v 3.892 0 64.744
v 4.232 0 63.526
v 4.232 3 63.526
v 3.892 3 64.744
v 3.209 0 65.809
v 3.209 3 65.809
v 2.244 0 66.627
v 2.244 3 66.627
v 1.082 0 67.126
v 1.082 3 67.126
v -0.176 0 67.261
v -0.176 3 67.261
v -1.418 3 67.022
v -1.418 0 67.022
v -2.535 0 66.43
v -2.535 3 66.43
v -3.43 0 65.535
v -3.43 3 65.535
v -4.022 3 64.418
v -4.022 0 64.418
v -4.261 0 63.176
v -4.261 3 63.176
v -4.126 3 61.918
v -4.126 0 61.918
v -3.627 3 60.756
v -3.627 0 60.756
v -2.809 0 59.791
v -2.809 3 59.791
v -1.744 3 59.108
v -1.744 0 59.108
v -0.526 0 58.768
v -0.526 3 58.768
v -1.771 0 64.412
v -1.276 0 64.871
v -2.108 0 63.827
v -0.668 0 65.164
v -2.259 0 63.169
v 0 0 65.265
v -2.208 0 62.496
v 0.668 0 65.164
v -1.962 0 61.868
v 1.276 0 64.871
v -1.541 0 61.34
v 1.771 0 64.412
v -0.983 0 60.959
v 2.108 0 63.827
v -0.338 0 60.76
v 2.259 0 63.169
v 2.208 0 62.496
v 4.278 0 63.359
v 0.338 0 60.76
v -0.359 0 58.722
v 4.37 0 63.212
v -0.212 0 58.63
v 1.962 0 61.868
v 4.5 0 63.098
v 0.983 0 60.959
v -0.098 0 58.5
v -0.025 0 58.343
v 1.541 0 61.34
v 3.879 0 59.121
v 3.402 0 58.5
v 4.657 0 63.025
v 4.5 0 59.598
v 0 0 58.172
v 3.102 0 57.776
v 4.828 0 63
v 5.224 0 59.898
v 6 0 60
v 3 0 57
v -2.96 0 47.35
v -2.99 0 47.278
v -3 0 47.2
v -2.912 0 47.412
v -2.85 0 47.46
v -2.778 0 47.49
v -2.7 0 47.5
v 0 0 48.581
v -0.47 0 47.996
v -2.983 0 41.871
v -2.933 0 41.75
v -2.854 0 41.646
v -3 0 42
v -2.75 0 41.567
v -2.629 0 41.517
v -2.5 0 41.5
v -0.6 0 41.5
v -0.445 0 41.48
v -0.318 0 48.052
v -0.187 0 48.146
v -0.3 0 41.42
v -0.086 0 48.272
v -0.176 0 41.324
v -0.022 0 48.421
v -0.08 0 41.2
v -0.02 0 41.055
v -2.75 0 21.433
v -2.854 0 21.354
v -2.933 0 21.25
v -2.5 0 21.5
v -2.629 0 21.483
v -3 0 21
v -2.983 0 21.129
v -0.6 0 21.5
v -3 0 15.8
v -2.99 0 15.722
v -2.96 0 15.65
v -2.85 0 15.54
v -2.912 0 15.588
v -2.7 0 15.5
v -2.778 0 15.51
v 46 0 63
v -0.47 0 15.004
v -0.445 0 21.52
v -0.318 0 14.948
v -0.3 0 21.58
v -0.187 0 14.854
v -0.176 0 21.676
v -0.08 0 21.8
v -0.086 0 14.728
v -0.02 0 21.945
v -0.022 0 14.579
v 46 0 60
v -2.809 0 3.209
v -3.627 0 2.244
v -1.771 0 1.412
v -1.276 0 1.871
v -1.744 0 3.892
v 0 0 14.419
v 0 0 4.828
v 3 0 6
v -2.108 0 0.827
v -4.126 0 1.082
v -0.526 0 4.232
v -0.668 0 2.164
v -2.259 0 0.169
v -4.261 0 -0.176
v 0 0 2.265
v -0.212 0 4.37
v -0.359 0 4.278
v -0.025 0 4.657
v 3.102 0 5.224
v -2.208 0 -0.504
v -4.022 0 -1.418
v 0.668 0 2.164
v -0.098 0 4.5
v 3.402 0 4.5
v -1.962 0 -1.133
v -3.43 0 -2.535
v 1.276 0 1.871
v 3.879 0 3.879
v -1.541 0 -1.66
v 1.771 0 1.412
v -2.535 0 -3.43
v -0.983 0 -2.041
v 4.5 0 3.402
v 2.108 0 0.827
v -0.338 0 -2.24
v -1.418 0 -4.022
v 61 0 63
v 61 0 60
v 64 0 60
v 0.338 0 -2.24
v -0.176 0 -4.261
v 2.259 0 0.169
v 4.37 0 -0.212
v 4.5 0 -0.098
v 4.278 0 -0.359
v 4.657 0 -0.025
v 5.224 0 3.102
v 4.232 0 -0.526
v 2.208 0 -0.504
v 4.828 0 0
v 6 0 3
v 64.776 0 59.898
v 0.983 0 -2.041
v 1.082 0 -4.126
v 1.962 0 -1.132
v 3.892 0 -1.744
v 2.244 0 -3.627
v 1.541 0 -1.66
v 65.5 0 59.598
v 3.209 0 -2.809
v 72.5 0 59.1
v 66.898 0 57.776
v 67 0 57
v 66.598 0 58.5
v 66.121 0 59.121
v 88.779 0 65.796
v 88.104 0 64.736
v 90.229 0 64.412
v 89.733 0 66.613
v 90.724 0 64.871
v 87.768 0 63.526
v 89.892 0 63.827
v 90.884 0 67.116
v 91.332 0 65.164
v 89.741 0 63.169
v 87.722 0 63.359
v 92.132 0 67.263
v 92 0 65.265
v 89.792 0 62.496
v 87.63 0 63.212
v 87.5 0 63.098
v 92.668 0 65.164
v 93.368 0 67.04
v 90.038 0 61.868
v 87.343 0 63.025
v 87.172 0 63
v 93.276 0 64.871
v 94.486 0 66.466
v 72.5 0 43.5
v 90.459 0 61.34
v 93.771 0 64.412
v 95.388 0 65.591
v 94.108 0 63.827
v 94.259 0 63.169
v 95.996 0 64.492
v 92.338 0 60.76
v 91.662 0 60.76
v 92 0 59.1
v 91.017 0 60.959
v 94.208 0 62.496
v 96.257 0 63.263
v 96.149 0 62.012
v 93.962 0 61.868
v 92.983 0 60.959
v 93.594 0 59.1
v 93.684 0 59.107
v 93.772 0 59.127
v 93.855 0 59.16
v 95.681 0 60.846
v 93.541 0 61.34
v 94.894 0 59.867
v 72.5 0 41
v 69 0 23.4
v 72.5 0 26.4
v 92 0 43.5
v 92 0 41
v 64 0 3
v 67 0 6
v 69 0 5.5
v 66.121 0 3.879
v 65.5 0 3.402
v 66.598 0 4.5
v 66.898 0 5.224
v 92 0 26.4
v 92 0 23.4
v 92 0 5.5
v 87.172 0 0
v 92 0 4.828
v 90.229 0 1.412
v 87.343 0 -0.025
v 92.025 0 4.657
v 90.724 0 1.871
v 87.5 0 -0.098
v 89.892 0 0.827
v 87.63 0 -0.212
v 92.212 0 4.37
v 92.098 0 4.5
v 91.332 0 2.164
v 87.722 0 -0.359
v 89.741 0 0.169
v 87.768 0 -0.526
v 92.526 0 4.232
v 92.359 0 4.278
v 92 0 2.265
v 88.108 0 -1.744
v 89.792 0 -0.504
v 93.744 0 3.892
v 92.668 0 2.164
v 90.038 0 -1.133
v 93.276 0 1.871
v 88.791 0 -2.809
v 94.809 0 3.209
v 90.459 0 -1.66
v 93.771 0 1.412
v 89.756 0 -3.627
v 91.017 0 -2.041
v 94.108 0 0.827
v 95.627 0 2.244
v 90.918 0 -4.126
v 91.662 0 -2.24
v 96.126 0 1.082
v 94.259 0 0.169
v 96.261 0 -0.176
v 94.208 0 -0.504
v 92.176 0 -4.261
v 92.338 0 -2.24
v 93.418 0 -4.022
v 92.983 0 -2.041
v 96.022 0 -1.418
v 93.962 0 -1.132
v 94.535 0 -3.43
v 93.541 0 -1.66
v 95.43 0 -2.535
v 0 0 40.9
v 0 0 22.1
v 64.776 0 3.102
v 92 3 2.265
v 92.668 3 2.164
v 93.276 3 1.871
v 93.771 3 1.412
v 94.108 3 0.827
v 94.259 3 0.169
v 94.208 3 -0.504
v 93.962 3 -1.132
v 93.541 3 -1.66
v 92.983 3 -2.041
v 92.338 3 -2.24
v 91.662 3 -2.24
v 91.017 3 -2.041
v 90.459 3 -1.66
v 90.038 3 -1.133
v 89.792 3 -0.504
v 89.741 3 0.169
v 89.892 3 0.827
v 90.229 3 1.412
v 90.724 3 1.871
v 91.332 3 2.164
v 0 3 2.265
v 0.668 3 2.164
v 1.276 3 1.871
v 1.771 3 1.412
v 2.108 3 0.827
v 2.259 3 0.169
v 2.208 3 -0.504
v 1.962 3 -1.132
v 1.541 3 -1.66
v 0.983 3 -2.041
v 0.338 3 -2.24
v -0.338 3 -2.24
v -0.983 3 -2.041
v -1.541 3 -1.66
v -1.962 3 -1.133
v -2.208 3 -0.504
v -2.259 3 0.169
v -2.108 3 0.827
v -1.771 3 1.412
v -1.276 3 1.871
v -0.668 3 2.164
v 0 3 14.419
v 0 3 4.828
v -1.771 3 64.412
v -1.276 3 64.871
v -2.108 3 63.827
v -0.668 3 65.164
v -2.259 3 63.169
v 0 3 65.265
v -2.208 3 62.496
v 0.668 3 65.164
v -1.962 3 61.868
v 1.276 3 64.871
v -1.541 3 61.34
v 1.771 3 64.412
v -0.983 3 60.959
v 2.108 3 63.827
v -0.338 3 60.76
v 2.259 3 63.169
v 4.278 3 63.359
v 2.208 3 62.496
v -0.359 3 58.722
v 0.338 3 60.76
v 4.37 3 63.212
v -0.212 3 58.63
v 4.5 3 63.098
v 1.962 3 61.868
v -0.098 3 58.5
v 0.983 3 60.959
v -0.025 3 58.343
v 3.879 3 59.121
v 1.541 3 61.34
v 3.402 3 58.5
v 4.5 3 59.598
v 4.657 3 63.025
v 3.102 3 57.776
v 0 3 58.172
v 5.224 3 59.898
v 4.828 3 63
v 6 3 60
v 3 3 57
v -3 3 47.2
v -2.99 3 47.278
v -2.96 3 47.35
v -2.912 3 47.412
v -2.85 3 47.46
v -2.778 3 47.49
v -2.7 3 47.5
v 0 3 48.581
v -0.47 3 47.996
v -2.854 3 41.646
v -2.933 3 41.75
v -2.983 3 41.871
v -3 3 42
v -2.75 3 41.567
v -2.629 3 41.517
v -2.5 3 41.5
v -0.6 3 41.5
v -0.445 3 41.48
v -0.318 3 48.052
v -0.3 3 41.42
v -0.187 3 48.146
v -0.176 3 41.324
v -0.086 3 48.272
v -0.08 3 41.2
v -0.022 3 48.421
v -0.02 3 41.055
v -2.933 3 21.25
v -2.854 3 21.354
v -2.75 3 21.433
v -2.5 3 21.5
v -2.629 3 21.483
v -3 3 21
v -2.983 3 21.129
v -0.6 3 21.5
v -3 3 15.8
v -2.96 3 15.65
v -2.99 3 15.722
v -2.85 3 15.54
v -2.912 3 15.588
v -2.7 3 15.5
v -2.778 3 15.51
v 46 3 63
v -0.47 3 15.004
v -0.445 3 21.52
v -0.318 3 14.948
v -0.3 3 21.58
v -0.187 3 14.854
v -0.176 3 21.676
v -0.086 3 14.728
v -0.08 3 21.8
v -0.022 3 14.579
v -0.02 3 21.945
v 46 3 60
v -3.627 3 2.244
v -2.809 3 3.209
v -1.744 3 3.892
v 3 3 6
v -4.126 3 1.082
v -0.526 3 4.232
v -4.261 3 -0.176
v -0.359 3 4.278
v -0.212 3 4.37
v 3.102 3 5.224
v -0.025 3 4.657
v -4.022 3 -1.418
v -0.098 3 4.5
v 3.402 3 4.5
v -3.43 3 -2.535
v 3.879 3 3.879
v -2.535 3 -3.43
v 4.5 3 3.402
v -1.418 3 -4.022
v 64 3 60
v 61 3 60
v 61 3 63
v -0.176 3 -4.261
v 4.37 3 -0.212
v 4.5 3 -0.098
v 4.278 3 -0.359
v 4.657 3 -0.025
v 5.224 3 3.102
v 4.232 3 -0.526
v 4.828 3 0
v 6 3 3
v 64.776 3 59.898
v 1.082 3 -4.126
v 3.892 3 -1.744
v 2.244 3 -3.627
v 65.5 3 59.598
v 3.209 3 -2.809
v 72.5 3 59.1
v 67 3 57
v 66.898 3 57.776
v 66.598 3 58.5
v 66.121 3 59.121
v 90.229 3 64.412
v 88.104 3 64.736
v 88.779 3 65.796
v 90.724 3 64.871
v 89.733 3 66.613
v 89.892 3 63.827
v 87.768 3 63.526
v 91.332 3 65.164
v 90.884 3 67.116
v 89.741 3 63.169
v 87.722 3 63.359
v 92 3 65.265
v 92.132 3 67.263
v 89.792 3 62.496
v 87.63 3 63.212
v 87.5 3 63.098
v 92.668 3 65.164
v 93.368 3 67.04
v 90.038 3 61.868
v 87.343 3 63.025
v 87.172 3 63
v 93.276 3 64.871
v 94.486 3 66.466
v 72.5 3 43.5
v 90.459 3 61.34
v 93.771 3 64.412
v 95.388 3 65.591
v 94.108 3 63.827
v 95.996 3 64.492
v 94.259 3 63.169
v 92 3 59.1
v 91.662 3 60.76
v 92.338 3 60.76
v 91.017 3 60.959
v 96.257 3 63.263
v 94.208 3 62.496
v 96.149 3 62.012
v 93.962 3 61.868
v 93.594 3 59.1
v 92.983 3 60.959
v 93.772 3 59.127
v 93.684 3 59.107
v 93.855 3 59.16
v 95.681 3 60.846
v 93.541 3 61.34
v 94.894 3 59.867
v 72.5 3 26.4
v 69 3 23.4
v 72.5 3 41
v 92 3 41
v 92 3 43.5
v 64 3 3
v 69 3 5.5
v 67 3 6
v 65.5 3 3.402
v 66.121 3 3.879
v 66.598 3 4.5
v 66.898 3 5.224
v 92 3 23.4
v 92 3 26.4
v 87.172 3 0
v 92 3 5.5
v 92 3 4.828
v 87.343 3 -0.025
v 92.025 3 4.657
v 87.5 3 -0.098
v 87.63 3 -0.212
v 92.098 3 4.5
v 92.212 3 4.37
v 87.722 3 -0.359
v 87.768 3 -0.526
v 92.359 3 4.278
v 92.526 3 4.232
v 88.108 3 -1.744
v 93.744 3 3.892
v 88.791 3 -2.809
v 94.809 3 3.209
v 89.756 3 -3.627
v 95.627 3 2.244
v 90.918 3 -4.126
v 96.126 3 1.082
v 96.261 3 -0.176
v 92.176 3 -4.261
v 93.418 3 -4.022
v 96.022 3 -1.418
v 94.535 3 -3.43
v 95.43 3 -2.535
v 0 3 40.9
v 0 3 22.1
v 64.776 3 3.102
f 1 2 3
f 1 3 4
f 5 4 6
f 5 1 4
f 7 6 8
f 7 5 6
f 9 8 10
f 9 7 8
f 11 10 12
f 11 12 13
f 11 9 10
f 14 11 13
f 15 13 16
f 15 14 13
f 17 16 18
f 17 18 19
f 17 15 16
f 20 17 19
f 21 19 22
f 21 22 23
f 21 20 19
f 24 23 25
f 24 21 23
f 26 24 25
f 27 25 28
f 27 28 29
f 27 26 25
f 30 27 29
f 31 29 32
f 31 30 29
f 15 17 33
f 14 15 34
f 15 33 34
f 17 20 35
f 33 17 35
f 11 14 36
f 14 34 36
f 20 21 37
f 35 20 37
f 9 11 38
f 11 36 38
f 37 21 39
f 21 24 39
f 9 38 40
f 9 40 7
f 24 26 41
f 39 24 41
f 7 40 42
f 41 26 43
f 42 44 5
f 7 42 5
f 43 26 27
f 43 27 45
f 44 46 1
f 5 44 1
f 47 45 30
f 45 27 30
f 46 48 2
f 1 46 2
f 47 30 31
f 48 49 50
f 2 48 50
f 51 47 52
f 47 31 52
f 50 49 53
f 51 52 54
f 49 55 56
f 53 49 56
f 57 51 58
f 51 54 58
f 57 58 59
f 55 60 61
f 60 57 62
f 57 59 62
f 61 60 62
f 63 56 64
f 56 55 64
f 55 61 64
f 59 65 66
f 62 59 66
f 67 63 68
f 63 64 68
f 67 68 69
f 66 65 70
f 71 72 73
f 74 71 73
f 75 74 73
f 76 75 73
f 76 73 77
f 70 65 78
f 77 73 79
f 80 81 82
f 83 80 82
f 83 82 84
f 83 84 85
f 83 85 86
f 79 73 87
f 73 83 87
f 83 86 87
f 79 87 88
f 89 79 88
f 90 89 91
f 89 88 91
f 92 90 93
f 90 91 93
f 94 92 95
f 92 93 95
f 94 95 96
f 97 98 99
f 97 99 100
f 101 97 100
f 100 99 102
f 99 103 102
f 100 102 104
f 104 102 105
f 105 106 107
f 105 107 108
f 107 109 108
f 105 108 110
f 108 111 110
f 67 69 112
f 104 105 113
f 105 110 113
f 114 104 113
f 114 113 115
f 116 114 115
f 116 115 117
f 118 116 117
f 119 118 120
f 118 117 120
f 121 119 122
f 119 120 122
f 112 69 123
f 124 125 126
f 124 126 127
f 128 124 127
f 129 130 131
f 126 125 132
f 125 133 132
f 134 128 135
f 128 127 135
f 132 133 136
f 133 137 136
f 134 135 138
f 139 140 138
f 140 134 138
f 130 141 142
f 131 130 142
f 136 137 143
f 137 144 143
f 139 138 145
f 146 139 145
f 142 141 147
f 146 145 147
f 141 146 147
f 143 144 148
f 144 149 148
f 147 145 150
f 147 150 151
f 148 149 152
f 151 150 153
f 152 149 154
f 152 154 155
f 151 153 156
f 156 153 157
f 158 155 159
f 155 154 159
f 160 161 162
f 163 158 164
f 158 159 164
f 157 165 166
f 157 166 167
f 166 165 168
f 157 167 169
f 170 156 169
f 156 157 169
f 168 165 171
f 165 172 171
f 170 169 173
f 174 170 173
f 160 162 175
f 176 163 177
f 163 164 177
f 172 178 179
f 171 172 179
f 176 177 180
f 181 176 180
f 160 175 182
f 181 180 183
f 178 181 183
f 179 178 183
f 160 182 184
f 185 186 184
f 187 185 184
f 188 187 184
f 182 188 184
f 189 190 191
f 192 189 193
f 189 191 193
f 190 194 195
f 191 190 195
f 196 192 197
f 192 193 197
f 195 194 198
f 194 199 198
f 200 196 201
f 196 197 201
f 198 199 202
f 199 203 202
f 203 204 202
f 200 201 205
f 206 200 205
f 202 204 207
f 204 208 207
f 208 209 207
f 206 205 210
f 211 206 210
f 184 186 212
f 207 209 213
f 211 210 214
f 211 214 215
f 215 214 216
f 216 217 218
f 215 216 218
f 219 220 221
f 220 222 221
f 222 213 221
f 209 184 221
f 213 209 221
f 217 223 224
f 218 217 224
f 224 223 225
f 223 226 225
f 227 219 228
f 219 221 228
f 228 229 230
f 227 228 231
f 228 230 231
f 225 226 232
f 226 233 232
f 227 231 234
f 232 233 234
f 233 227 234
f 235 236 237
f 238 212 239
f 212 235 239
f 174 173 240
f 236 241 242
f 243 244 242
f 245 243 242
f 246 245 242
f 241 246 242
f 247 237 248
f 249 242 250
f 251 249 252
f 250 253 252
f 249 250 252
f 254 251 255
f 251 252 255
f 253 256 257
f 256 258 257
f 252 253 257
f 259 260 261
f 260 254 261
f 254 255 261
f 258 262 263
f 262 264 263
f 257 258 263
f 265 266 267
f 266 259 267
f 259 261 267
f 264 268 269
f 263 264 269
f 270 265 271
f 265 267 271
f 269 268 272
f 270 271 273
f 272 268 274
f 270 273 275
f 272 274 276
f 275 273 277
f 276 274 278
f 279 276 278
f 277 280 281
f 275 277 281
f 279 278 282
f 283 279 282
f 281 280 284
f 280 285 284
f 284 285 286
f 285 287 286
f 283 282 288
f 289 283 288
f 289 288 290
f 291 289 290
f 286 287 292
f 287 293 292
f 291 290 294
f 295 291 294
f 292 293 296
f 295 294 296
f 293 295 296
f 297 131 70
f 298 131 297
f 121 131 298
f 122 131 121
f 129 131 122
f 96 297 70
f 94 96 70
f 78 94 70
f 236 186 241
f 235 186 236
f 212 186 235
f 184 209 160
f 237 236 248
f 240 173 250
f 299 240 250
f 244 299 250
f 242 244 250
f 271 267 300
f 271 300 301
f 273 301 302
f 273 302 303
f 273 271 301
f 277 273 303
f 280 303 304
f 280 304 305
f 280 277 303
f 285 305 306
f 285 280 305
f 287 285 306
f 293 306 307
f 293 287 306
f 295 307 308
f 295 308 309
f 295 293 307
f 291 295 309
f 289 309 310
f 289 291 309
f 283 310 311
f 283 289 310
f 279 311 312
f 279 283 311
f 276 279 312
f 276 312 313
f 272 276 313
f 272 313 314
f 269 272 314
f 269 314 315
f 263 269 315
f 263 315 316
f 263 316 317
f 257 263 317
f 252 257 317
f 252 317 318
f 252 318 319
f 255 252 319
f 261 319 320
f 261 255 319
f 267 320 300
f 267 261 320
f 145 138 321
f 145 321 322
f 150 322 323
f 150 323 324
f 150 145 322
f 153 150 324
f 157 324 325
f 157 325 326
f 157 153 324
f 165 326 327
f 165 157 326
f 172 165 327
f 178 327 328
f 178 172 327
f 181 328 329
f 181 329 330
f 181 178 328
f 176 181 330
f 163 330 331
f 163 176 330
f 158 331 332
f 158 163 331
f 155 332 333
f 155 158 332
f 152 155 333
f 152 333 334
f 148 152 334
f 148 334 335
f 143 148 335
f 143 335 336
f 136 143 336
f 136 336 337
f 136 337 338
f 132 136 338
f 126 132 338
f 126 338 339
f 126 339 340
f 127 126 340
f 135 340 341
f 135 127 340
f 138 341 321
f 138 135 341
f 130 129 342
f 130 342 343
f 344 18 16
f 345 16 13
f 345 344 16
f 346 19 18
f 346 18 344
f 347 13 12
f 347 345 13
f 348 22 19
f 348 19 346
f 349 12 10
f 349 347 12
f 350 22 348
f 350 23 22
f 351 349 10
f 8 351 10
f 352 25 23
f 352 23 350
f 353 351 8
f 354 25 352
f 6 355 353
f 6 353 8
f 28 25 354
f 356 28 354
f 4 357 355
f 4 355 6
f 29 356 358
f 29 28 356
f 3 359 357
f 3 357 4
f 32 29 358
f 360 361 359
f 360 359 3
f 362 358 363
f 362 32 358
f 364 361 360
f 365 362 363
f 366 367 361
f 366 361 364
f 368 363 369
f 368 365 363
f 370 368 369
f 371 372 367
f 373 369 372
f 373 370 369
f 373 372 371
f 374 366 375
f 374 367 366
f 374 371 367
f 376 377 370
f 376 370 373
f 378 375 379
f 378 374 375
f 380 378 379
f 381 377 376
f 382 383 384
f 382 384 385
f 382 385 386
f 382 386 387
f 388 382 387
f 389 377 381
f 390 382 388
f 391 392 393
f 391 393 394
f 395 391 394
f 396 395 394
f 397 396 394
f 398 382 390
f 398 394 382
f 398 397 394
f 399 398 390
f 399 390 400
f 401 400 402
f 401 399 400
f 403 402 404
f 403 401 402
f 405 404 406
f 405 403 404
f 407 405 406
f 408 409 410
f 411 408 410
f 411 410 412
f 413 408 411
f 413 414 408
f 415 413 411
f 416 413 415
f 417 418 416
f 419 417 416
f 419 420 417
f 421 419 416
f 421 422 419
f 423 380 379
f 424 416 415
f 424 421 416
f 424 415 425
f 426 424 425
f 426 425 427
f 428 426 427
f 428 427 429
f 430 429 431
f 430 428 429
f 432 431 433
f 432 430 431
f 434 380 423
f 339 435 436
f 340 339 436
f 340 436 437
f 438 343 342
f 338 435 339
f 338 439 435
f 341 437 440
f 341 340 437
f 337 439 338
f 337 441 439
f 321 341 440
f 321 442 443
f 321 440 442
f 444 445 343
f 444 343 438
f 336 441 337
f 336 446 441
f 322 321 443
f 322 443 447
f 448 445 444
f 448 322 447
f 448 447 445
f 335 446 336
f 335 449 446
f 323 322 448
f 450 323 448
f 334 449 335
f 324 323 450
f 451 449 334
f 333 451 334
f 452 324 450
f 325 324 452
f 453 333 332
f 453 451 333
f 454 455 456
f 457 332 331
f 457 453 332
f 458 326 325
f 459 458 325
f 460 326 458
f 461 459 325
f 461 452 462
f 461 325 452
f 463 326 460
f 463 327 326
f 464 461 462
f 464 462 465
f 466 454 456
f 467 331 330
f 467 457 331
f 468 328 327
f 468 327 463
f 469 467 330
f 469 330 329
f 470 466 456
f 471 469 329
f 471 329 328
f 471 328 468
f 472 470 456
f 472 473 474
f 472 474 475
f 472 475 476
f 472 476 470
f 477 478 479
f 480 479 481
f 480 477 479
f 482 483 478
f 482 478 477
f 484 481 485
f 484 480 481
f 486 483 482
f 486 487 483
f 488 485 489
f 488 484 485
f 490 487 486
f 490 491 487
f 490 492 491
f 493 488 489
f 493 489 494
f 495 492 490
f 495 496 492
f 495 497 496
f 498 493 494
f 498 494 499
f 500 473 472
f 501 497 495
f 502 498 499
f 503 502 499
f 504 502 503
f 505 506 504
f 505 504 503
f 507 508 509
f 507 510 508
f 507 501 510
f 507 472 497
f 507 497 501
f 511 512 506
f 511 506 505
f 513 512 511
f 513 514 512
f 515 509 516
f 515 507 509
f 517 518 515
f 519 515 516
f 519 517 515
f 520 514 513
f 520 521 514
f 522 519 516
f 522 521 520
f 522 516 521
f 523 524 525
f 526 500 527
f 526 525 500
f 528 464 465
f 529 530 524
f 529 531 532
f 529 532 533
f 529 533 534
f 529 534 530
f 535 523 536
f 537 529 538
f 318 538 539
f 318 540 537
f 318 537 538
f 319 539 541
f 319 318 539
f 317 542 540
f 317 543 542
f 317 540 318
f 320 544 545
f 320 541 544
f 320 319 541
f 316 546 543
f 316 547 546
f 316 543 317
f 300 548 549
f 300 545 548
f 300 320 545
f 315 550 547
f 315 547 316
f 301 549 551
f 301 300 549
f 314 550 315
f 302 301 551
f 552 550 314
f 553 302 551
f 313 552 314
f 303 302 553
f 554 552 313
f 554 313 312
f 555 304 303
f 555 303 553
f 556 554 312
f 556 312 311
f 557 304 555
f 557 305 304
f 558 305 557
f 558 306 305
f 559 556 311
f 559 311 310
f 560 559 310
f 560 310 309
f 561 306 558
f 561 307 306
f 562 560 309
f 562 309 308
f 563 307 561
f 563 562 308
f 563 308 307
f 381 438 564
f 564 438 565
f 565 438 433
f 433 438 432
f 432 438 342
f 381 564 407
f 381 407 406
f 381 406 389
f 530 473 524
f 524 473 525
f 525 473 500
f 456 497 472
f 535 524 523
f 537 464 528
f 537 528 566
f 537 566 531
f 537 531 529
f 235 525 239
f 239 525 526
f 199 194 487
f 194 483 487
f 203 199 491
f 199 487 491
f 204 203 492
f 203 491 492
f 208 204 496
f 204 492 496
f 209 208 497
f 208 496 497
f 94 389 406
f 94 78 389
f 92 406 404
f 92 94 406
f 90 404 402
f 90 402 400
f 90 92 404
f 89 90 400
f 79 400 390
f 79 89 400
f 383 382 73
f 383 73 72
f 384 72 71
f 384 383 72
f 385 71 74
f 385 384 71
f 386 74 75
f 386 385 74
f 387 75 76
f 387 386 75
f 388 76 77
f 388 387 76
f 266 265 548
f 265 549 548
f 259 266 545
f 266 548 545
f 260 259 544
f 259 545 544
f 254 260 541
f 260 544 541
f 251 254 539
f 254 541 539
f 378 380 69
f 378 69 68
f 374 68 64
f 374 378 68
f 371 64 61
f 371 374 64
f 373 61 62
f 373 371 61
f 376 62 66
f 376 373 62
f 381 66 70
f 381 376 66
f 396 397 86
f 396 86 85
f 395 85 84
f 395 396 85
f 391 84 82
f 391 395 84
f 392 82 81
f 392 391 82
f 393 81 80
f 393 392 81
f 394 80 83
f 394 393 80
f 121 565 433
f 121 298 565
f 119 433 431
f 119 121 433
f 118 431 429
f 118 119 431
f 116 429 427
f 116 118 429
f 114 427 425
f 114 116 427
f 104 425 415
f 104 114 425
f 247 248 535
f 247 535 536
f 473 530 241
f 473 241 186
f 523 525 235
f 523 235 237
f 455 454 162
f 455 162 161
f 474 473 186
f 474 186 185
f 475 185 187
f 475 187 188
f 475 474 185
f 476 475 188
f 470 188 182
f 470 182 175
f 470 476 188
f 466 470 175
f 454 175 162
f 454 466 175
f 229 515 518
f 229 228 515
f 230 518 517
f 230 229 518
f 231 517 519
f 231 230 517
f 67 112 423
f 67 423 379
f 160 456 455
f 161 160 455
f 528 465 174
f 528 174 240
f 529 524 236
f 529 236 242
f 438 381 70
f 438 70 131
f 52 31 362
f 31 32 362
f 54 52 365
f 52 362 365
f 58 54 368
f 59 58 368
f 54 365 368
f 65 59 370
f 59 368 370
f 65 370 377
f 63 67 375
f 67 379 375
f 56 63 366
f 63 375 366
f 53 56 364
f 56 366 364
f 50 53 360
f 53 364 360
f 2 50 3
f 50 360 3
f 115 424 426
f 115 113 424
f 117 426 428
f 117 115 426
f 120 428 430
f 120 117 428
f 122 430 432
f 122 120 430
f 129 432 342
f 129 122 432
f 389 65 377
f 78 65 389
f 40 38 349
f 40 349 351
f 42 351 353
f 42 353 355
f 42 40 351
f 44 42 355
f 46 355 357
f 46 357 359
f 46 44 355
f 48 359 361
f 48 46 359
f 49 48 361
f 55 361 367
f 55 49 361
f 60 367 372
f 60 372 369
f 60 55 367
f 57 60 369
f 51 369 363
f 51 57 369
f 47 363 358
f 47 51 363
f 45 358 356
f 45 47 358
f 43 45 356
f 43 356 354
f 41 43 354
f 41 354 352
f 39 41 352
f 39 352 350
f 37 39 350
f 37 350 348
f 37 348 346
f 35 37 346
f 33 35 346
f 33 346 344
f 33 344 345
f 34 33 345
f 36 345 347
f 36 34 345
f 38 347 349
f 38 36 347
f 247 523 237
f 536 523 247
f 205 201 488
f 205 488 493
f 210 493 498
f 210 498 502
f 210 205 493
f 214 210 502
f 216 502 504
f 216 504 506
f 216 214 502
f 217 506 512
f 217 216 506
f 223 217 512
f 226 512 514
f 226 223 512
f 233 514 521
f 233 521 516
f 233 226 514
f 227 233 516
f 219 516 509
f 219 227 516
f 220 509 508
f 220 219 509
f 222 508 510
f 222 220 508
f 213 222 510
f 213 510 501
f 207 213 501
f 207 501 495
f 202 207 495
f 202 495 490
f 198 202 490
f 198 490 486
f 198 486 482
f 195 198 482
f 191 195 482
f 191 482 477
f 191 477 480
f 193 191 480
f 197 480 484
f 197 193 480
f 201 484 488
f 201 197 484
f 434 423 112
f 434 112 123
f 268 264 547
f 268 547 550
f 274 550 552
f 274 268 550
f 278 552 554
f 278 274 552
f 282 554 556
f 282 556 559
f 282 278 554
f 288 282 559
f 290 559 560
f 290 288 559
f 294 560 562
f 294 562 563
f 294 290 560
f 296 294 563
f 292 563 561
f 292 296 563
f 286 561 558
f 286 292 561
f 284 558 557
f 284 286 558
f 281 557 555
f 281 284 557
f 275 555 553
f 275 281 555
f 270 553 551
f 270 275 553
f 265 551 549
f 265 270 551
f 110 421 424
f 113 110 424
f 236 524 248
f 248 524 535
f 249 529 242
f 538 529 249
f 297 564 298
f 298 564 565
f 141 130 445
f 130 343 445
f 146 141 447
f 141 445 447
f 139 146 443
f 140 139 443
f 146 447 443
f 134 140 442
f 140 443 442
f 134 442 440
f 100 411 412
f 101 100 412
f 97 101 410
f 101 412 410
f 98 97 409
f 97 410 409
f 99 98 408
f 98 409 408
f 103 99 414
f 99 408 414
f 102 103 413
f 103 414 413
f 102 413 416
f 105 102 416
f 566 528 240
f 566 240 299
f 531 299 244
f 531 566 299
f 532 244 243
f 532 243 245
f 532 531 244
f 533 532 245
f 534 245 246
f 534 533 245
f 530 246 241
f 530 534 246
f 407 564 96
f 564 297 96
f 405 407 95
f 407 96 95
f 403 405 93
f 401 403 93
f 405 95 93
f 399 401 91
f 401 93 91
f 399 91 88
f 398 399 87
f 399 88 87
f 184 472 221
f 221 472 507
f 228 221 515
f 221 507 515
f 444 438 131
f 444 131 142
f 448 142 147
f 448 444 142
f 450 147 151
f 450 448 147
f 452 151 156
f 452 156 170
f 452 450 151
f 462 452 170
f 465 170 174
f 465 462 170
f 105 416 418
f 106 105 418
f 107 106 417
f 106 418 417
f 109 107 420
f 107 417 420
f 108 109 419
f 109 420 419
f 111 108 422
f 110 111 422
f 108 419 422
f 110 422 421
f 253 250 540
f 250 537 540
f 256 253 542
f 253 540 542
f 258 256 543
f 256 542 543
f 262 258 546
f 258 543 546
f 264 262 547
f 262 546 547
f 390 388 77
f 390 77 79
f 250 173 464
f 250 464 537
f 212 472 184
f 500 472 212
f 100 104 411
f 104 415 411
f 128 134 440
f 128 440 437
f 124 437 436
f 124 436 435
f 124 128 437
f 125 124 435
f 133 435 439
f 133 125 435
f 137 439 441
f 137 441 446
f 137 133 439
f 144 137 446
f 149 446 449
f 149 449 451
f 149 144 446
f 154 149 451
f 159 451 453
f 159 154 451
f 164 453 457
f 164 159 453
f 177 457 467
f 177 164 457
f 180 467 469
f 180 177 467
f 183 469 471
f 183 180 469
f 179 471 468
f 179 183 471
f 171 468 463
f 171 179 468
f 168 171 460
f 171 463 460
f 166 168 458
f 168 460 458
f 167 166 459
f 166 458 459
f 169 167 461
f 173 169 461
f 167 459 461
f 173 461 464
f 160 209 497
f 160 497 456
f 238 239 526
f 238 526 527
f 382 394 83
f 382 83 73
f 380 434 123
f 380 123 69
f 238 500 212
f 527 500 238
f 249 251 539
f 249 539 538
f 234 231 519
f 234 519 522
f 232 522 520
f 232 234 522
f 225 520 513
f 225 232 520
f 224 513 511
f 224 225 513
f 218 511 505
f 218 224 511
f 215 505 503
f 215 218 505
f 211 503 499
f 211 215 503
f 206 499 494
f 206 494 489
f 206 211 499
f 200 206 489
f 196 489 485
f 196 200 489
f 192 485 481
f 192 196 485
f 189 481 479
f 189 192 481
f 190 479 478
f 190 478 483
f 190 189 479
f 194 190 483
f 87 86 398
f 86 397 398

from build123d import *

# Parameters (mm, degrees)
SKETCH1_R           = 2.265
BOSS_EXTRUDE1_DEPTH = 3
SKETCH2_W           = 6.5
SKETCH2_H           = 20
CUT_EXTRUDE1_DEPTH  = 3
BOSS_EXTRUDE2_DEPTH = 3
CUT_EXTRUDE2_DEPTH  = 3
SKETCH5_W           = 3
SKETCH5_H           = 20
BOSS_EXTRUDE3_DEPTH = 3
SKETCH6_W           = 27.010134686
SKETCH6_H           = 17.9
CUT_EXTRUDE3_DEPTH  = 3
SKETCH7_W           = 19.5
SKETCH7_H           = 14.6
CUT_EXTRUDE4_DEPTH  = 3
SKETCH8_W           = 19.5
SKETCH8_H           = 15.6
CUT_EXTRUDE5_DEPTH  = 3
SKETCH9_W           = 2.019620965
SKETCH9_H           = 0.574286347
CUT_EXTRUDE6_DEPTH  = 3
SKETCH10_W          = 15
SKETCH10_H          = 3
CUT_EXTRUDE7_DEPTH  = 3
FILLET1_R           = 0.6


with BuildPart() as part:
    # Sketch1 → Boss-Extrude1 (new body)
    with BuildSketch(Plane(origin=(0, 0, 0), x_dir=(1, 0, 0), z_dir=(0, 1, 0))):
        with BuildLine():
            Line((4.265, 0), (87.735, 0))
            ThreePointArc((87.735, 0), (95.015810422, 3.015810422), (92, -4.265))
            Line((92, -4.265), (92, -58.735))
            ThreePointArc((92, -58.735), (95.015810422, -66.015810422), (87.735, -63))
            Line((87.735, -63), (4.265, -63))
            ThreePointArc((4.265, -63), (-3.015810422, -66.015810422), (0, -58.735))
            Line((0, -58.735), (0, -4.265))
            ThreePointArc((0, -4.265), (-3.015810422, 3.015810422), (4.265, 0))
        make_face()
        with Locations(Location((0, 0, 0), (0, 0, 270))):
            Circle(SKETCH1_R, mode=Mode.SUBTRACT)
        with Locations(Location((92, 0, 0), (0, 0, 270))):
            Circle(SKETCH1_R, mode=Mode.SUBTRACT)
        with Locations(Location((92, -63, 0), (0, 0, 270))):
            Circle(SKETCH1_R, mode=Mode.SUBTRACT)
        with Locations(Location((0, -63, 0), (0, 0, 270))):
            Circle(SKETCH1_R, mode=Mode.SUBTRACT)
    extrude(amount=BOSS_EXTRUDE1_DEPTH)

    # Sketch2 → Cut-Extrude1 (cut)
    with BuildSketch(Plane(origin=(0, 3, 0), x_dir=(1, 0, 0), z_dir=(0, 1, 0))):
        with Locations((3.25, -31.5)):
            Rectangle(SKETCH2_W, SKETCH2_H)
    extrude(amount=-CUT_EXTRUDE1_DEPTH, mode=Mode.SUBTRACT)

    # Sketch3 → Boss-Extrude2 (add)
    with BuildSketch(Plane(origin=(0, 3, 0), x_dir=(1, 0, 0), z_dir=(0, 1, 0))):
        with BuildLine():
            Line((-2.7, -15.5), (0, -14.9))
            Line((0, -14.9), (0, -21.5))
            Line((0, -21.5), (-2.5, -21.5))
            ThreePointArc((-2.5, -21.5), (-2.853553391, -21.353553391), (-3, -21))
            Line((-3, -21), (-3, -15.8))
            ThreePointArc((-3, -15.8), (-2.912132034, -15.587867966), (-2.7, -15.5))
        make_face()
        with BuildLine():
            Line((-3, -42), (-3, -47.2))
            ThreePointArc((-3, -47.2), (-2.912132034, -47.412132034), (-2.7, -47.5))
            Line((-2.7, -47.5), (0, -48.1))
            Line((0, -48.1), (0, -41.5))
            Line((0, -41.5), (-2.5, -41.5))
            ThreePointArc((-2.5, -41.5), (-2.853553391, -41.646446609), (-3, -42))
        make_face()
    extrude(amount=-BOSS_EXTRUDE2_DEPTH)

    # Sketch4 → Cut-Extrude2 (cut)
    with BuildSketch(Plane(origin=(0, 3, 0), x_dir=(1, 0, 0), z_dir=(0, 1, 0))):
        with BuildLine():
            Line((6, -3), (64, -3))
            ThreePointArc((64, -3), (66.121320344, -3.878679656), (67, -6))
            Line((67, -6), (67, -57))
            ThreePointArc((67, -57), (66.121320344, -59.121320344), (64, -60))
            Line((64, -60), (6, -60))
            ThreePointArc((6, -60), (3.878679656, -59.121320344), (3, -57))
            Line((3, -57), (3, -6))
            ThreePointArc((3, -6), (3.878679656, -3.878679656), (6, -3))
        make_face()
    extrude(amount=-CUT_EXTRUDE2_DEPTH, mode=Mode.SUBTRACT)

    # Sketch5 → Boss-Extrude3 (add)
    with BuildSketch(Plane(origin=(0, 3, 0), x_dir=(1, 0, 0), z_dir=(0, 1, 0))):
        with Locations((1.5, -31.5)):
            Rectangle(SKETCH5_W, SKETCH5_H)
    extrude(amount=-BOSS_EXTRUDE3_DEPTH)

    # Sketch6 → Cut-Extrude3 (cut)
    with BuildSketch(Plane(origin=(0, 3, 0), x_dir=(1, 0, 0), z_dir=(0, 1, 0))):
        with Locations((82.505067343, -14.45)):
            Rectangle(SKETCH6_W, SKETCH6_H)
    extrude(amount=-CUT_EXTRUDE3_DEPTH, mode=Mode.SUBTRACT)

    # Sketch7 → Cut-Extrude4 (cut)
    with BuildSketch(Plane(origin=(0, 3, 0), x_dir=(1, 0, 0), z_dir=(0, 1, 0))):
        with Locations((82.25, -33.7)):
            Rectangle(SKETCH7_W, SKETCH7_H)
    extrude(amount=-CUT_EXTRUDE4_DEPTH, mode=Mode.SUBTRACT)

    # Sketch8 → Cut-Extrude5 (cut)
    with BuildSketch(Plane(origin=(0, 3, 0), x_dir=(1, 0, 0), z_dir=(0, 1, 0))):
        with Locations((82.25, -51.3)):
            Rectangle(SKETCH8_W, SKETCH8_H)
    extrude(amount=-CUT_EXTRUDE5_DEPTH, mode=Mode.SUBTRACT)

    # Sketch9 → Cut-Extrude6 (cut)
    with BuildSketch(Plane(origin=(0, 3, 0), x_dir=(1, 0, 0), z_dir=(0, 1, 0))):
        with Locations((93.009810483, -58.812856827)):
            Rectangle(SKETCH9_W, SKETCH9_H)
    extrude(amount=-CUT_EXTRUDE6_DEPTH, mode=Mode.SUBTRACT)

    # Sketch10 → Cut-Extrude7 (cut)
    with BuildSketch(Plane(origin=(0, 3, 0), x_dir=(1, 0, 0), z_dir=(0, 1, 0))):
        with Locations((53.5, -61.5)):
            Rectangle(SKETCH10_W, SKETCH10_H)
    extrude(amount=-CUT_EXTRUDE7_DEPTH, mode=Mode.SUBTRACT)

    # Fillet1
    fillet1_edges = [part.edges().sort_by_distance(p)[0] for p in [
        (0, 1.5, 41.5),
        (92, 1.5, 4.265),
        (0, 1.5, 21.5),
        (87.735, 1.5, 63),
        (4.265, 1.5, 63),
        (0, 1.5, 58.735),
        (0, 1.5, 4.265),
        (4.265, 1.5, 0),
        (87.735, 1.5, 0),
        (93.726332818, 1.5, 59.1),
        (0, 1.5, 14.9),
        (0, 1.5, 48.1),
    ]]
    fillet(fillet1_edges, radius=FILLET1_R)


solid = part.part
